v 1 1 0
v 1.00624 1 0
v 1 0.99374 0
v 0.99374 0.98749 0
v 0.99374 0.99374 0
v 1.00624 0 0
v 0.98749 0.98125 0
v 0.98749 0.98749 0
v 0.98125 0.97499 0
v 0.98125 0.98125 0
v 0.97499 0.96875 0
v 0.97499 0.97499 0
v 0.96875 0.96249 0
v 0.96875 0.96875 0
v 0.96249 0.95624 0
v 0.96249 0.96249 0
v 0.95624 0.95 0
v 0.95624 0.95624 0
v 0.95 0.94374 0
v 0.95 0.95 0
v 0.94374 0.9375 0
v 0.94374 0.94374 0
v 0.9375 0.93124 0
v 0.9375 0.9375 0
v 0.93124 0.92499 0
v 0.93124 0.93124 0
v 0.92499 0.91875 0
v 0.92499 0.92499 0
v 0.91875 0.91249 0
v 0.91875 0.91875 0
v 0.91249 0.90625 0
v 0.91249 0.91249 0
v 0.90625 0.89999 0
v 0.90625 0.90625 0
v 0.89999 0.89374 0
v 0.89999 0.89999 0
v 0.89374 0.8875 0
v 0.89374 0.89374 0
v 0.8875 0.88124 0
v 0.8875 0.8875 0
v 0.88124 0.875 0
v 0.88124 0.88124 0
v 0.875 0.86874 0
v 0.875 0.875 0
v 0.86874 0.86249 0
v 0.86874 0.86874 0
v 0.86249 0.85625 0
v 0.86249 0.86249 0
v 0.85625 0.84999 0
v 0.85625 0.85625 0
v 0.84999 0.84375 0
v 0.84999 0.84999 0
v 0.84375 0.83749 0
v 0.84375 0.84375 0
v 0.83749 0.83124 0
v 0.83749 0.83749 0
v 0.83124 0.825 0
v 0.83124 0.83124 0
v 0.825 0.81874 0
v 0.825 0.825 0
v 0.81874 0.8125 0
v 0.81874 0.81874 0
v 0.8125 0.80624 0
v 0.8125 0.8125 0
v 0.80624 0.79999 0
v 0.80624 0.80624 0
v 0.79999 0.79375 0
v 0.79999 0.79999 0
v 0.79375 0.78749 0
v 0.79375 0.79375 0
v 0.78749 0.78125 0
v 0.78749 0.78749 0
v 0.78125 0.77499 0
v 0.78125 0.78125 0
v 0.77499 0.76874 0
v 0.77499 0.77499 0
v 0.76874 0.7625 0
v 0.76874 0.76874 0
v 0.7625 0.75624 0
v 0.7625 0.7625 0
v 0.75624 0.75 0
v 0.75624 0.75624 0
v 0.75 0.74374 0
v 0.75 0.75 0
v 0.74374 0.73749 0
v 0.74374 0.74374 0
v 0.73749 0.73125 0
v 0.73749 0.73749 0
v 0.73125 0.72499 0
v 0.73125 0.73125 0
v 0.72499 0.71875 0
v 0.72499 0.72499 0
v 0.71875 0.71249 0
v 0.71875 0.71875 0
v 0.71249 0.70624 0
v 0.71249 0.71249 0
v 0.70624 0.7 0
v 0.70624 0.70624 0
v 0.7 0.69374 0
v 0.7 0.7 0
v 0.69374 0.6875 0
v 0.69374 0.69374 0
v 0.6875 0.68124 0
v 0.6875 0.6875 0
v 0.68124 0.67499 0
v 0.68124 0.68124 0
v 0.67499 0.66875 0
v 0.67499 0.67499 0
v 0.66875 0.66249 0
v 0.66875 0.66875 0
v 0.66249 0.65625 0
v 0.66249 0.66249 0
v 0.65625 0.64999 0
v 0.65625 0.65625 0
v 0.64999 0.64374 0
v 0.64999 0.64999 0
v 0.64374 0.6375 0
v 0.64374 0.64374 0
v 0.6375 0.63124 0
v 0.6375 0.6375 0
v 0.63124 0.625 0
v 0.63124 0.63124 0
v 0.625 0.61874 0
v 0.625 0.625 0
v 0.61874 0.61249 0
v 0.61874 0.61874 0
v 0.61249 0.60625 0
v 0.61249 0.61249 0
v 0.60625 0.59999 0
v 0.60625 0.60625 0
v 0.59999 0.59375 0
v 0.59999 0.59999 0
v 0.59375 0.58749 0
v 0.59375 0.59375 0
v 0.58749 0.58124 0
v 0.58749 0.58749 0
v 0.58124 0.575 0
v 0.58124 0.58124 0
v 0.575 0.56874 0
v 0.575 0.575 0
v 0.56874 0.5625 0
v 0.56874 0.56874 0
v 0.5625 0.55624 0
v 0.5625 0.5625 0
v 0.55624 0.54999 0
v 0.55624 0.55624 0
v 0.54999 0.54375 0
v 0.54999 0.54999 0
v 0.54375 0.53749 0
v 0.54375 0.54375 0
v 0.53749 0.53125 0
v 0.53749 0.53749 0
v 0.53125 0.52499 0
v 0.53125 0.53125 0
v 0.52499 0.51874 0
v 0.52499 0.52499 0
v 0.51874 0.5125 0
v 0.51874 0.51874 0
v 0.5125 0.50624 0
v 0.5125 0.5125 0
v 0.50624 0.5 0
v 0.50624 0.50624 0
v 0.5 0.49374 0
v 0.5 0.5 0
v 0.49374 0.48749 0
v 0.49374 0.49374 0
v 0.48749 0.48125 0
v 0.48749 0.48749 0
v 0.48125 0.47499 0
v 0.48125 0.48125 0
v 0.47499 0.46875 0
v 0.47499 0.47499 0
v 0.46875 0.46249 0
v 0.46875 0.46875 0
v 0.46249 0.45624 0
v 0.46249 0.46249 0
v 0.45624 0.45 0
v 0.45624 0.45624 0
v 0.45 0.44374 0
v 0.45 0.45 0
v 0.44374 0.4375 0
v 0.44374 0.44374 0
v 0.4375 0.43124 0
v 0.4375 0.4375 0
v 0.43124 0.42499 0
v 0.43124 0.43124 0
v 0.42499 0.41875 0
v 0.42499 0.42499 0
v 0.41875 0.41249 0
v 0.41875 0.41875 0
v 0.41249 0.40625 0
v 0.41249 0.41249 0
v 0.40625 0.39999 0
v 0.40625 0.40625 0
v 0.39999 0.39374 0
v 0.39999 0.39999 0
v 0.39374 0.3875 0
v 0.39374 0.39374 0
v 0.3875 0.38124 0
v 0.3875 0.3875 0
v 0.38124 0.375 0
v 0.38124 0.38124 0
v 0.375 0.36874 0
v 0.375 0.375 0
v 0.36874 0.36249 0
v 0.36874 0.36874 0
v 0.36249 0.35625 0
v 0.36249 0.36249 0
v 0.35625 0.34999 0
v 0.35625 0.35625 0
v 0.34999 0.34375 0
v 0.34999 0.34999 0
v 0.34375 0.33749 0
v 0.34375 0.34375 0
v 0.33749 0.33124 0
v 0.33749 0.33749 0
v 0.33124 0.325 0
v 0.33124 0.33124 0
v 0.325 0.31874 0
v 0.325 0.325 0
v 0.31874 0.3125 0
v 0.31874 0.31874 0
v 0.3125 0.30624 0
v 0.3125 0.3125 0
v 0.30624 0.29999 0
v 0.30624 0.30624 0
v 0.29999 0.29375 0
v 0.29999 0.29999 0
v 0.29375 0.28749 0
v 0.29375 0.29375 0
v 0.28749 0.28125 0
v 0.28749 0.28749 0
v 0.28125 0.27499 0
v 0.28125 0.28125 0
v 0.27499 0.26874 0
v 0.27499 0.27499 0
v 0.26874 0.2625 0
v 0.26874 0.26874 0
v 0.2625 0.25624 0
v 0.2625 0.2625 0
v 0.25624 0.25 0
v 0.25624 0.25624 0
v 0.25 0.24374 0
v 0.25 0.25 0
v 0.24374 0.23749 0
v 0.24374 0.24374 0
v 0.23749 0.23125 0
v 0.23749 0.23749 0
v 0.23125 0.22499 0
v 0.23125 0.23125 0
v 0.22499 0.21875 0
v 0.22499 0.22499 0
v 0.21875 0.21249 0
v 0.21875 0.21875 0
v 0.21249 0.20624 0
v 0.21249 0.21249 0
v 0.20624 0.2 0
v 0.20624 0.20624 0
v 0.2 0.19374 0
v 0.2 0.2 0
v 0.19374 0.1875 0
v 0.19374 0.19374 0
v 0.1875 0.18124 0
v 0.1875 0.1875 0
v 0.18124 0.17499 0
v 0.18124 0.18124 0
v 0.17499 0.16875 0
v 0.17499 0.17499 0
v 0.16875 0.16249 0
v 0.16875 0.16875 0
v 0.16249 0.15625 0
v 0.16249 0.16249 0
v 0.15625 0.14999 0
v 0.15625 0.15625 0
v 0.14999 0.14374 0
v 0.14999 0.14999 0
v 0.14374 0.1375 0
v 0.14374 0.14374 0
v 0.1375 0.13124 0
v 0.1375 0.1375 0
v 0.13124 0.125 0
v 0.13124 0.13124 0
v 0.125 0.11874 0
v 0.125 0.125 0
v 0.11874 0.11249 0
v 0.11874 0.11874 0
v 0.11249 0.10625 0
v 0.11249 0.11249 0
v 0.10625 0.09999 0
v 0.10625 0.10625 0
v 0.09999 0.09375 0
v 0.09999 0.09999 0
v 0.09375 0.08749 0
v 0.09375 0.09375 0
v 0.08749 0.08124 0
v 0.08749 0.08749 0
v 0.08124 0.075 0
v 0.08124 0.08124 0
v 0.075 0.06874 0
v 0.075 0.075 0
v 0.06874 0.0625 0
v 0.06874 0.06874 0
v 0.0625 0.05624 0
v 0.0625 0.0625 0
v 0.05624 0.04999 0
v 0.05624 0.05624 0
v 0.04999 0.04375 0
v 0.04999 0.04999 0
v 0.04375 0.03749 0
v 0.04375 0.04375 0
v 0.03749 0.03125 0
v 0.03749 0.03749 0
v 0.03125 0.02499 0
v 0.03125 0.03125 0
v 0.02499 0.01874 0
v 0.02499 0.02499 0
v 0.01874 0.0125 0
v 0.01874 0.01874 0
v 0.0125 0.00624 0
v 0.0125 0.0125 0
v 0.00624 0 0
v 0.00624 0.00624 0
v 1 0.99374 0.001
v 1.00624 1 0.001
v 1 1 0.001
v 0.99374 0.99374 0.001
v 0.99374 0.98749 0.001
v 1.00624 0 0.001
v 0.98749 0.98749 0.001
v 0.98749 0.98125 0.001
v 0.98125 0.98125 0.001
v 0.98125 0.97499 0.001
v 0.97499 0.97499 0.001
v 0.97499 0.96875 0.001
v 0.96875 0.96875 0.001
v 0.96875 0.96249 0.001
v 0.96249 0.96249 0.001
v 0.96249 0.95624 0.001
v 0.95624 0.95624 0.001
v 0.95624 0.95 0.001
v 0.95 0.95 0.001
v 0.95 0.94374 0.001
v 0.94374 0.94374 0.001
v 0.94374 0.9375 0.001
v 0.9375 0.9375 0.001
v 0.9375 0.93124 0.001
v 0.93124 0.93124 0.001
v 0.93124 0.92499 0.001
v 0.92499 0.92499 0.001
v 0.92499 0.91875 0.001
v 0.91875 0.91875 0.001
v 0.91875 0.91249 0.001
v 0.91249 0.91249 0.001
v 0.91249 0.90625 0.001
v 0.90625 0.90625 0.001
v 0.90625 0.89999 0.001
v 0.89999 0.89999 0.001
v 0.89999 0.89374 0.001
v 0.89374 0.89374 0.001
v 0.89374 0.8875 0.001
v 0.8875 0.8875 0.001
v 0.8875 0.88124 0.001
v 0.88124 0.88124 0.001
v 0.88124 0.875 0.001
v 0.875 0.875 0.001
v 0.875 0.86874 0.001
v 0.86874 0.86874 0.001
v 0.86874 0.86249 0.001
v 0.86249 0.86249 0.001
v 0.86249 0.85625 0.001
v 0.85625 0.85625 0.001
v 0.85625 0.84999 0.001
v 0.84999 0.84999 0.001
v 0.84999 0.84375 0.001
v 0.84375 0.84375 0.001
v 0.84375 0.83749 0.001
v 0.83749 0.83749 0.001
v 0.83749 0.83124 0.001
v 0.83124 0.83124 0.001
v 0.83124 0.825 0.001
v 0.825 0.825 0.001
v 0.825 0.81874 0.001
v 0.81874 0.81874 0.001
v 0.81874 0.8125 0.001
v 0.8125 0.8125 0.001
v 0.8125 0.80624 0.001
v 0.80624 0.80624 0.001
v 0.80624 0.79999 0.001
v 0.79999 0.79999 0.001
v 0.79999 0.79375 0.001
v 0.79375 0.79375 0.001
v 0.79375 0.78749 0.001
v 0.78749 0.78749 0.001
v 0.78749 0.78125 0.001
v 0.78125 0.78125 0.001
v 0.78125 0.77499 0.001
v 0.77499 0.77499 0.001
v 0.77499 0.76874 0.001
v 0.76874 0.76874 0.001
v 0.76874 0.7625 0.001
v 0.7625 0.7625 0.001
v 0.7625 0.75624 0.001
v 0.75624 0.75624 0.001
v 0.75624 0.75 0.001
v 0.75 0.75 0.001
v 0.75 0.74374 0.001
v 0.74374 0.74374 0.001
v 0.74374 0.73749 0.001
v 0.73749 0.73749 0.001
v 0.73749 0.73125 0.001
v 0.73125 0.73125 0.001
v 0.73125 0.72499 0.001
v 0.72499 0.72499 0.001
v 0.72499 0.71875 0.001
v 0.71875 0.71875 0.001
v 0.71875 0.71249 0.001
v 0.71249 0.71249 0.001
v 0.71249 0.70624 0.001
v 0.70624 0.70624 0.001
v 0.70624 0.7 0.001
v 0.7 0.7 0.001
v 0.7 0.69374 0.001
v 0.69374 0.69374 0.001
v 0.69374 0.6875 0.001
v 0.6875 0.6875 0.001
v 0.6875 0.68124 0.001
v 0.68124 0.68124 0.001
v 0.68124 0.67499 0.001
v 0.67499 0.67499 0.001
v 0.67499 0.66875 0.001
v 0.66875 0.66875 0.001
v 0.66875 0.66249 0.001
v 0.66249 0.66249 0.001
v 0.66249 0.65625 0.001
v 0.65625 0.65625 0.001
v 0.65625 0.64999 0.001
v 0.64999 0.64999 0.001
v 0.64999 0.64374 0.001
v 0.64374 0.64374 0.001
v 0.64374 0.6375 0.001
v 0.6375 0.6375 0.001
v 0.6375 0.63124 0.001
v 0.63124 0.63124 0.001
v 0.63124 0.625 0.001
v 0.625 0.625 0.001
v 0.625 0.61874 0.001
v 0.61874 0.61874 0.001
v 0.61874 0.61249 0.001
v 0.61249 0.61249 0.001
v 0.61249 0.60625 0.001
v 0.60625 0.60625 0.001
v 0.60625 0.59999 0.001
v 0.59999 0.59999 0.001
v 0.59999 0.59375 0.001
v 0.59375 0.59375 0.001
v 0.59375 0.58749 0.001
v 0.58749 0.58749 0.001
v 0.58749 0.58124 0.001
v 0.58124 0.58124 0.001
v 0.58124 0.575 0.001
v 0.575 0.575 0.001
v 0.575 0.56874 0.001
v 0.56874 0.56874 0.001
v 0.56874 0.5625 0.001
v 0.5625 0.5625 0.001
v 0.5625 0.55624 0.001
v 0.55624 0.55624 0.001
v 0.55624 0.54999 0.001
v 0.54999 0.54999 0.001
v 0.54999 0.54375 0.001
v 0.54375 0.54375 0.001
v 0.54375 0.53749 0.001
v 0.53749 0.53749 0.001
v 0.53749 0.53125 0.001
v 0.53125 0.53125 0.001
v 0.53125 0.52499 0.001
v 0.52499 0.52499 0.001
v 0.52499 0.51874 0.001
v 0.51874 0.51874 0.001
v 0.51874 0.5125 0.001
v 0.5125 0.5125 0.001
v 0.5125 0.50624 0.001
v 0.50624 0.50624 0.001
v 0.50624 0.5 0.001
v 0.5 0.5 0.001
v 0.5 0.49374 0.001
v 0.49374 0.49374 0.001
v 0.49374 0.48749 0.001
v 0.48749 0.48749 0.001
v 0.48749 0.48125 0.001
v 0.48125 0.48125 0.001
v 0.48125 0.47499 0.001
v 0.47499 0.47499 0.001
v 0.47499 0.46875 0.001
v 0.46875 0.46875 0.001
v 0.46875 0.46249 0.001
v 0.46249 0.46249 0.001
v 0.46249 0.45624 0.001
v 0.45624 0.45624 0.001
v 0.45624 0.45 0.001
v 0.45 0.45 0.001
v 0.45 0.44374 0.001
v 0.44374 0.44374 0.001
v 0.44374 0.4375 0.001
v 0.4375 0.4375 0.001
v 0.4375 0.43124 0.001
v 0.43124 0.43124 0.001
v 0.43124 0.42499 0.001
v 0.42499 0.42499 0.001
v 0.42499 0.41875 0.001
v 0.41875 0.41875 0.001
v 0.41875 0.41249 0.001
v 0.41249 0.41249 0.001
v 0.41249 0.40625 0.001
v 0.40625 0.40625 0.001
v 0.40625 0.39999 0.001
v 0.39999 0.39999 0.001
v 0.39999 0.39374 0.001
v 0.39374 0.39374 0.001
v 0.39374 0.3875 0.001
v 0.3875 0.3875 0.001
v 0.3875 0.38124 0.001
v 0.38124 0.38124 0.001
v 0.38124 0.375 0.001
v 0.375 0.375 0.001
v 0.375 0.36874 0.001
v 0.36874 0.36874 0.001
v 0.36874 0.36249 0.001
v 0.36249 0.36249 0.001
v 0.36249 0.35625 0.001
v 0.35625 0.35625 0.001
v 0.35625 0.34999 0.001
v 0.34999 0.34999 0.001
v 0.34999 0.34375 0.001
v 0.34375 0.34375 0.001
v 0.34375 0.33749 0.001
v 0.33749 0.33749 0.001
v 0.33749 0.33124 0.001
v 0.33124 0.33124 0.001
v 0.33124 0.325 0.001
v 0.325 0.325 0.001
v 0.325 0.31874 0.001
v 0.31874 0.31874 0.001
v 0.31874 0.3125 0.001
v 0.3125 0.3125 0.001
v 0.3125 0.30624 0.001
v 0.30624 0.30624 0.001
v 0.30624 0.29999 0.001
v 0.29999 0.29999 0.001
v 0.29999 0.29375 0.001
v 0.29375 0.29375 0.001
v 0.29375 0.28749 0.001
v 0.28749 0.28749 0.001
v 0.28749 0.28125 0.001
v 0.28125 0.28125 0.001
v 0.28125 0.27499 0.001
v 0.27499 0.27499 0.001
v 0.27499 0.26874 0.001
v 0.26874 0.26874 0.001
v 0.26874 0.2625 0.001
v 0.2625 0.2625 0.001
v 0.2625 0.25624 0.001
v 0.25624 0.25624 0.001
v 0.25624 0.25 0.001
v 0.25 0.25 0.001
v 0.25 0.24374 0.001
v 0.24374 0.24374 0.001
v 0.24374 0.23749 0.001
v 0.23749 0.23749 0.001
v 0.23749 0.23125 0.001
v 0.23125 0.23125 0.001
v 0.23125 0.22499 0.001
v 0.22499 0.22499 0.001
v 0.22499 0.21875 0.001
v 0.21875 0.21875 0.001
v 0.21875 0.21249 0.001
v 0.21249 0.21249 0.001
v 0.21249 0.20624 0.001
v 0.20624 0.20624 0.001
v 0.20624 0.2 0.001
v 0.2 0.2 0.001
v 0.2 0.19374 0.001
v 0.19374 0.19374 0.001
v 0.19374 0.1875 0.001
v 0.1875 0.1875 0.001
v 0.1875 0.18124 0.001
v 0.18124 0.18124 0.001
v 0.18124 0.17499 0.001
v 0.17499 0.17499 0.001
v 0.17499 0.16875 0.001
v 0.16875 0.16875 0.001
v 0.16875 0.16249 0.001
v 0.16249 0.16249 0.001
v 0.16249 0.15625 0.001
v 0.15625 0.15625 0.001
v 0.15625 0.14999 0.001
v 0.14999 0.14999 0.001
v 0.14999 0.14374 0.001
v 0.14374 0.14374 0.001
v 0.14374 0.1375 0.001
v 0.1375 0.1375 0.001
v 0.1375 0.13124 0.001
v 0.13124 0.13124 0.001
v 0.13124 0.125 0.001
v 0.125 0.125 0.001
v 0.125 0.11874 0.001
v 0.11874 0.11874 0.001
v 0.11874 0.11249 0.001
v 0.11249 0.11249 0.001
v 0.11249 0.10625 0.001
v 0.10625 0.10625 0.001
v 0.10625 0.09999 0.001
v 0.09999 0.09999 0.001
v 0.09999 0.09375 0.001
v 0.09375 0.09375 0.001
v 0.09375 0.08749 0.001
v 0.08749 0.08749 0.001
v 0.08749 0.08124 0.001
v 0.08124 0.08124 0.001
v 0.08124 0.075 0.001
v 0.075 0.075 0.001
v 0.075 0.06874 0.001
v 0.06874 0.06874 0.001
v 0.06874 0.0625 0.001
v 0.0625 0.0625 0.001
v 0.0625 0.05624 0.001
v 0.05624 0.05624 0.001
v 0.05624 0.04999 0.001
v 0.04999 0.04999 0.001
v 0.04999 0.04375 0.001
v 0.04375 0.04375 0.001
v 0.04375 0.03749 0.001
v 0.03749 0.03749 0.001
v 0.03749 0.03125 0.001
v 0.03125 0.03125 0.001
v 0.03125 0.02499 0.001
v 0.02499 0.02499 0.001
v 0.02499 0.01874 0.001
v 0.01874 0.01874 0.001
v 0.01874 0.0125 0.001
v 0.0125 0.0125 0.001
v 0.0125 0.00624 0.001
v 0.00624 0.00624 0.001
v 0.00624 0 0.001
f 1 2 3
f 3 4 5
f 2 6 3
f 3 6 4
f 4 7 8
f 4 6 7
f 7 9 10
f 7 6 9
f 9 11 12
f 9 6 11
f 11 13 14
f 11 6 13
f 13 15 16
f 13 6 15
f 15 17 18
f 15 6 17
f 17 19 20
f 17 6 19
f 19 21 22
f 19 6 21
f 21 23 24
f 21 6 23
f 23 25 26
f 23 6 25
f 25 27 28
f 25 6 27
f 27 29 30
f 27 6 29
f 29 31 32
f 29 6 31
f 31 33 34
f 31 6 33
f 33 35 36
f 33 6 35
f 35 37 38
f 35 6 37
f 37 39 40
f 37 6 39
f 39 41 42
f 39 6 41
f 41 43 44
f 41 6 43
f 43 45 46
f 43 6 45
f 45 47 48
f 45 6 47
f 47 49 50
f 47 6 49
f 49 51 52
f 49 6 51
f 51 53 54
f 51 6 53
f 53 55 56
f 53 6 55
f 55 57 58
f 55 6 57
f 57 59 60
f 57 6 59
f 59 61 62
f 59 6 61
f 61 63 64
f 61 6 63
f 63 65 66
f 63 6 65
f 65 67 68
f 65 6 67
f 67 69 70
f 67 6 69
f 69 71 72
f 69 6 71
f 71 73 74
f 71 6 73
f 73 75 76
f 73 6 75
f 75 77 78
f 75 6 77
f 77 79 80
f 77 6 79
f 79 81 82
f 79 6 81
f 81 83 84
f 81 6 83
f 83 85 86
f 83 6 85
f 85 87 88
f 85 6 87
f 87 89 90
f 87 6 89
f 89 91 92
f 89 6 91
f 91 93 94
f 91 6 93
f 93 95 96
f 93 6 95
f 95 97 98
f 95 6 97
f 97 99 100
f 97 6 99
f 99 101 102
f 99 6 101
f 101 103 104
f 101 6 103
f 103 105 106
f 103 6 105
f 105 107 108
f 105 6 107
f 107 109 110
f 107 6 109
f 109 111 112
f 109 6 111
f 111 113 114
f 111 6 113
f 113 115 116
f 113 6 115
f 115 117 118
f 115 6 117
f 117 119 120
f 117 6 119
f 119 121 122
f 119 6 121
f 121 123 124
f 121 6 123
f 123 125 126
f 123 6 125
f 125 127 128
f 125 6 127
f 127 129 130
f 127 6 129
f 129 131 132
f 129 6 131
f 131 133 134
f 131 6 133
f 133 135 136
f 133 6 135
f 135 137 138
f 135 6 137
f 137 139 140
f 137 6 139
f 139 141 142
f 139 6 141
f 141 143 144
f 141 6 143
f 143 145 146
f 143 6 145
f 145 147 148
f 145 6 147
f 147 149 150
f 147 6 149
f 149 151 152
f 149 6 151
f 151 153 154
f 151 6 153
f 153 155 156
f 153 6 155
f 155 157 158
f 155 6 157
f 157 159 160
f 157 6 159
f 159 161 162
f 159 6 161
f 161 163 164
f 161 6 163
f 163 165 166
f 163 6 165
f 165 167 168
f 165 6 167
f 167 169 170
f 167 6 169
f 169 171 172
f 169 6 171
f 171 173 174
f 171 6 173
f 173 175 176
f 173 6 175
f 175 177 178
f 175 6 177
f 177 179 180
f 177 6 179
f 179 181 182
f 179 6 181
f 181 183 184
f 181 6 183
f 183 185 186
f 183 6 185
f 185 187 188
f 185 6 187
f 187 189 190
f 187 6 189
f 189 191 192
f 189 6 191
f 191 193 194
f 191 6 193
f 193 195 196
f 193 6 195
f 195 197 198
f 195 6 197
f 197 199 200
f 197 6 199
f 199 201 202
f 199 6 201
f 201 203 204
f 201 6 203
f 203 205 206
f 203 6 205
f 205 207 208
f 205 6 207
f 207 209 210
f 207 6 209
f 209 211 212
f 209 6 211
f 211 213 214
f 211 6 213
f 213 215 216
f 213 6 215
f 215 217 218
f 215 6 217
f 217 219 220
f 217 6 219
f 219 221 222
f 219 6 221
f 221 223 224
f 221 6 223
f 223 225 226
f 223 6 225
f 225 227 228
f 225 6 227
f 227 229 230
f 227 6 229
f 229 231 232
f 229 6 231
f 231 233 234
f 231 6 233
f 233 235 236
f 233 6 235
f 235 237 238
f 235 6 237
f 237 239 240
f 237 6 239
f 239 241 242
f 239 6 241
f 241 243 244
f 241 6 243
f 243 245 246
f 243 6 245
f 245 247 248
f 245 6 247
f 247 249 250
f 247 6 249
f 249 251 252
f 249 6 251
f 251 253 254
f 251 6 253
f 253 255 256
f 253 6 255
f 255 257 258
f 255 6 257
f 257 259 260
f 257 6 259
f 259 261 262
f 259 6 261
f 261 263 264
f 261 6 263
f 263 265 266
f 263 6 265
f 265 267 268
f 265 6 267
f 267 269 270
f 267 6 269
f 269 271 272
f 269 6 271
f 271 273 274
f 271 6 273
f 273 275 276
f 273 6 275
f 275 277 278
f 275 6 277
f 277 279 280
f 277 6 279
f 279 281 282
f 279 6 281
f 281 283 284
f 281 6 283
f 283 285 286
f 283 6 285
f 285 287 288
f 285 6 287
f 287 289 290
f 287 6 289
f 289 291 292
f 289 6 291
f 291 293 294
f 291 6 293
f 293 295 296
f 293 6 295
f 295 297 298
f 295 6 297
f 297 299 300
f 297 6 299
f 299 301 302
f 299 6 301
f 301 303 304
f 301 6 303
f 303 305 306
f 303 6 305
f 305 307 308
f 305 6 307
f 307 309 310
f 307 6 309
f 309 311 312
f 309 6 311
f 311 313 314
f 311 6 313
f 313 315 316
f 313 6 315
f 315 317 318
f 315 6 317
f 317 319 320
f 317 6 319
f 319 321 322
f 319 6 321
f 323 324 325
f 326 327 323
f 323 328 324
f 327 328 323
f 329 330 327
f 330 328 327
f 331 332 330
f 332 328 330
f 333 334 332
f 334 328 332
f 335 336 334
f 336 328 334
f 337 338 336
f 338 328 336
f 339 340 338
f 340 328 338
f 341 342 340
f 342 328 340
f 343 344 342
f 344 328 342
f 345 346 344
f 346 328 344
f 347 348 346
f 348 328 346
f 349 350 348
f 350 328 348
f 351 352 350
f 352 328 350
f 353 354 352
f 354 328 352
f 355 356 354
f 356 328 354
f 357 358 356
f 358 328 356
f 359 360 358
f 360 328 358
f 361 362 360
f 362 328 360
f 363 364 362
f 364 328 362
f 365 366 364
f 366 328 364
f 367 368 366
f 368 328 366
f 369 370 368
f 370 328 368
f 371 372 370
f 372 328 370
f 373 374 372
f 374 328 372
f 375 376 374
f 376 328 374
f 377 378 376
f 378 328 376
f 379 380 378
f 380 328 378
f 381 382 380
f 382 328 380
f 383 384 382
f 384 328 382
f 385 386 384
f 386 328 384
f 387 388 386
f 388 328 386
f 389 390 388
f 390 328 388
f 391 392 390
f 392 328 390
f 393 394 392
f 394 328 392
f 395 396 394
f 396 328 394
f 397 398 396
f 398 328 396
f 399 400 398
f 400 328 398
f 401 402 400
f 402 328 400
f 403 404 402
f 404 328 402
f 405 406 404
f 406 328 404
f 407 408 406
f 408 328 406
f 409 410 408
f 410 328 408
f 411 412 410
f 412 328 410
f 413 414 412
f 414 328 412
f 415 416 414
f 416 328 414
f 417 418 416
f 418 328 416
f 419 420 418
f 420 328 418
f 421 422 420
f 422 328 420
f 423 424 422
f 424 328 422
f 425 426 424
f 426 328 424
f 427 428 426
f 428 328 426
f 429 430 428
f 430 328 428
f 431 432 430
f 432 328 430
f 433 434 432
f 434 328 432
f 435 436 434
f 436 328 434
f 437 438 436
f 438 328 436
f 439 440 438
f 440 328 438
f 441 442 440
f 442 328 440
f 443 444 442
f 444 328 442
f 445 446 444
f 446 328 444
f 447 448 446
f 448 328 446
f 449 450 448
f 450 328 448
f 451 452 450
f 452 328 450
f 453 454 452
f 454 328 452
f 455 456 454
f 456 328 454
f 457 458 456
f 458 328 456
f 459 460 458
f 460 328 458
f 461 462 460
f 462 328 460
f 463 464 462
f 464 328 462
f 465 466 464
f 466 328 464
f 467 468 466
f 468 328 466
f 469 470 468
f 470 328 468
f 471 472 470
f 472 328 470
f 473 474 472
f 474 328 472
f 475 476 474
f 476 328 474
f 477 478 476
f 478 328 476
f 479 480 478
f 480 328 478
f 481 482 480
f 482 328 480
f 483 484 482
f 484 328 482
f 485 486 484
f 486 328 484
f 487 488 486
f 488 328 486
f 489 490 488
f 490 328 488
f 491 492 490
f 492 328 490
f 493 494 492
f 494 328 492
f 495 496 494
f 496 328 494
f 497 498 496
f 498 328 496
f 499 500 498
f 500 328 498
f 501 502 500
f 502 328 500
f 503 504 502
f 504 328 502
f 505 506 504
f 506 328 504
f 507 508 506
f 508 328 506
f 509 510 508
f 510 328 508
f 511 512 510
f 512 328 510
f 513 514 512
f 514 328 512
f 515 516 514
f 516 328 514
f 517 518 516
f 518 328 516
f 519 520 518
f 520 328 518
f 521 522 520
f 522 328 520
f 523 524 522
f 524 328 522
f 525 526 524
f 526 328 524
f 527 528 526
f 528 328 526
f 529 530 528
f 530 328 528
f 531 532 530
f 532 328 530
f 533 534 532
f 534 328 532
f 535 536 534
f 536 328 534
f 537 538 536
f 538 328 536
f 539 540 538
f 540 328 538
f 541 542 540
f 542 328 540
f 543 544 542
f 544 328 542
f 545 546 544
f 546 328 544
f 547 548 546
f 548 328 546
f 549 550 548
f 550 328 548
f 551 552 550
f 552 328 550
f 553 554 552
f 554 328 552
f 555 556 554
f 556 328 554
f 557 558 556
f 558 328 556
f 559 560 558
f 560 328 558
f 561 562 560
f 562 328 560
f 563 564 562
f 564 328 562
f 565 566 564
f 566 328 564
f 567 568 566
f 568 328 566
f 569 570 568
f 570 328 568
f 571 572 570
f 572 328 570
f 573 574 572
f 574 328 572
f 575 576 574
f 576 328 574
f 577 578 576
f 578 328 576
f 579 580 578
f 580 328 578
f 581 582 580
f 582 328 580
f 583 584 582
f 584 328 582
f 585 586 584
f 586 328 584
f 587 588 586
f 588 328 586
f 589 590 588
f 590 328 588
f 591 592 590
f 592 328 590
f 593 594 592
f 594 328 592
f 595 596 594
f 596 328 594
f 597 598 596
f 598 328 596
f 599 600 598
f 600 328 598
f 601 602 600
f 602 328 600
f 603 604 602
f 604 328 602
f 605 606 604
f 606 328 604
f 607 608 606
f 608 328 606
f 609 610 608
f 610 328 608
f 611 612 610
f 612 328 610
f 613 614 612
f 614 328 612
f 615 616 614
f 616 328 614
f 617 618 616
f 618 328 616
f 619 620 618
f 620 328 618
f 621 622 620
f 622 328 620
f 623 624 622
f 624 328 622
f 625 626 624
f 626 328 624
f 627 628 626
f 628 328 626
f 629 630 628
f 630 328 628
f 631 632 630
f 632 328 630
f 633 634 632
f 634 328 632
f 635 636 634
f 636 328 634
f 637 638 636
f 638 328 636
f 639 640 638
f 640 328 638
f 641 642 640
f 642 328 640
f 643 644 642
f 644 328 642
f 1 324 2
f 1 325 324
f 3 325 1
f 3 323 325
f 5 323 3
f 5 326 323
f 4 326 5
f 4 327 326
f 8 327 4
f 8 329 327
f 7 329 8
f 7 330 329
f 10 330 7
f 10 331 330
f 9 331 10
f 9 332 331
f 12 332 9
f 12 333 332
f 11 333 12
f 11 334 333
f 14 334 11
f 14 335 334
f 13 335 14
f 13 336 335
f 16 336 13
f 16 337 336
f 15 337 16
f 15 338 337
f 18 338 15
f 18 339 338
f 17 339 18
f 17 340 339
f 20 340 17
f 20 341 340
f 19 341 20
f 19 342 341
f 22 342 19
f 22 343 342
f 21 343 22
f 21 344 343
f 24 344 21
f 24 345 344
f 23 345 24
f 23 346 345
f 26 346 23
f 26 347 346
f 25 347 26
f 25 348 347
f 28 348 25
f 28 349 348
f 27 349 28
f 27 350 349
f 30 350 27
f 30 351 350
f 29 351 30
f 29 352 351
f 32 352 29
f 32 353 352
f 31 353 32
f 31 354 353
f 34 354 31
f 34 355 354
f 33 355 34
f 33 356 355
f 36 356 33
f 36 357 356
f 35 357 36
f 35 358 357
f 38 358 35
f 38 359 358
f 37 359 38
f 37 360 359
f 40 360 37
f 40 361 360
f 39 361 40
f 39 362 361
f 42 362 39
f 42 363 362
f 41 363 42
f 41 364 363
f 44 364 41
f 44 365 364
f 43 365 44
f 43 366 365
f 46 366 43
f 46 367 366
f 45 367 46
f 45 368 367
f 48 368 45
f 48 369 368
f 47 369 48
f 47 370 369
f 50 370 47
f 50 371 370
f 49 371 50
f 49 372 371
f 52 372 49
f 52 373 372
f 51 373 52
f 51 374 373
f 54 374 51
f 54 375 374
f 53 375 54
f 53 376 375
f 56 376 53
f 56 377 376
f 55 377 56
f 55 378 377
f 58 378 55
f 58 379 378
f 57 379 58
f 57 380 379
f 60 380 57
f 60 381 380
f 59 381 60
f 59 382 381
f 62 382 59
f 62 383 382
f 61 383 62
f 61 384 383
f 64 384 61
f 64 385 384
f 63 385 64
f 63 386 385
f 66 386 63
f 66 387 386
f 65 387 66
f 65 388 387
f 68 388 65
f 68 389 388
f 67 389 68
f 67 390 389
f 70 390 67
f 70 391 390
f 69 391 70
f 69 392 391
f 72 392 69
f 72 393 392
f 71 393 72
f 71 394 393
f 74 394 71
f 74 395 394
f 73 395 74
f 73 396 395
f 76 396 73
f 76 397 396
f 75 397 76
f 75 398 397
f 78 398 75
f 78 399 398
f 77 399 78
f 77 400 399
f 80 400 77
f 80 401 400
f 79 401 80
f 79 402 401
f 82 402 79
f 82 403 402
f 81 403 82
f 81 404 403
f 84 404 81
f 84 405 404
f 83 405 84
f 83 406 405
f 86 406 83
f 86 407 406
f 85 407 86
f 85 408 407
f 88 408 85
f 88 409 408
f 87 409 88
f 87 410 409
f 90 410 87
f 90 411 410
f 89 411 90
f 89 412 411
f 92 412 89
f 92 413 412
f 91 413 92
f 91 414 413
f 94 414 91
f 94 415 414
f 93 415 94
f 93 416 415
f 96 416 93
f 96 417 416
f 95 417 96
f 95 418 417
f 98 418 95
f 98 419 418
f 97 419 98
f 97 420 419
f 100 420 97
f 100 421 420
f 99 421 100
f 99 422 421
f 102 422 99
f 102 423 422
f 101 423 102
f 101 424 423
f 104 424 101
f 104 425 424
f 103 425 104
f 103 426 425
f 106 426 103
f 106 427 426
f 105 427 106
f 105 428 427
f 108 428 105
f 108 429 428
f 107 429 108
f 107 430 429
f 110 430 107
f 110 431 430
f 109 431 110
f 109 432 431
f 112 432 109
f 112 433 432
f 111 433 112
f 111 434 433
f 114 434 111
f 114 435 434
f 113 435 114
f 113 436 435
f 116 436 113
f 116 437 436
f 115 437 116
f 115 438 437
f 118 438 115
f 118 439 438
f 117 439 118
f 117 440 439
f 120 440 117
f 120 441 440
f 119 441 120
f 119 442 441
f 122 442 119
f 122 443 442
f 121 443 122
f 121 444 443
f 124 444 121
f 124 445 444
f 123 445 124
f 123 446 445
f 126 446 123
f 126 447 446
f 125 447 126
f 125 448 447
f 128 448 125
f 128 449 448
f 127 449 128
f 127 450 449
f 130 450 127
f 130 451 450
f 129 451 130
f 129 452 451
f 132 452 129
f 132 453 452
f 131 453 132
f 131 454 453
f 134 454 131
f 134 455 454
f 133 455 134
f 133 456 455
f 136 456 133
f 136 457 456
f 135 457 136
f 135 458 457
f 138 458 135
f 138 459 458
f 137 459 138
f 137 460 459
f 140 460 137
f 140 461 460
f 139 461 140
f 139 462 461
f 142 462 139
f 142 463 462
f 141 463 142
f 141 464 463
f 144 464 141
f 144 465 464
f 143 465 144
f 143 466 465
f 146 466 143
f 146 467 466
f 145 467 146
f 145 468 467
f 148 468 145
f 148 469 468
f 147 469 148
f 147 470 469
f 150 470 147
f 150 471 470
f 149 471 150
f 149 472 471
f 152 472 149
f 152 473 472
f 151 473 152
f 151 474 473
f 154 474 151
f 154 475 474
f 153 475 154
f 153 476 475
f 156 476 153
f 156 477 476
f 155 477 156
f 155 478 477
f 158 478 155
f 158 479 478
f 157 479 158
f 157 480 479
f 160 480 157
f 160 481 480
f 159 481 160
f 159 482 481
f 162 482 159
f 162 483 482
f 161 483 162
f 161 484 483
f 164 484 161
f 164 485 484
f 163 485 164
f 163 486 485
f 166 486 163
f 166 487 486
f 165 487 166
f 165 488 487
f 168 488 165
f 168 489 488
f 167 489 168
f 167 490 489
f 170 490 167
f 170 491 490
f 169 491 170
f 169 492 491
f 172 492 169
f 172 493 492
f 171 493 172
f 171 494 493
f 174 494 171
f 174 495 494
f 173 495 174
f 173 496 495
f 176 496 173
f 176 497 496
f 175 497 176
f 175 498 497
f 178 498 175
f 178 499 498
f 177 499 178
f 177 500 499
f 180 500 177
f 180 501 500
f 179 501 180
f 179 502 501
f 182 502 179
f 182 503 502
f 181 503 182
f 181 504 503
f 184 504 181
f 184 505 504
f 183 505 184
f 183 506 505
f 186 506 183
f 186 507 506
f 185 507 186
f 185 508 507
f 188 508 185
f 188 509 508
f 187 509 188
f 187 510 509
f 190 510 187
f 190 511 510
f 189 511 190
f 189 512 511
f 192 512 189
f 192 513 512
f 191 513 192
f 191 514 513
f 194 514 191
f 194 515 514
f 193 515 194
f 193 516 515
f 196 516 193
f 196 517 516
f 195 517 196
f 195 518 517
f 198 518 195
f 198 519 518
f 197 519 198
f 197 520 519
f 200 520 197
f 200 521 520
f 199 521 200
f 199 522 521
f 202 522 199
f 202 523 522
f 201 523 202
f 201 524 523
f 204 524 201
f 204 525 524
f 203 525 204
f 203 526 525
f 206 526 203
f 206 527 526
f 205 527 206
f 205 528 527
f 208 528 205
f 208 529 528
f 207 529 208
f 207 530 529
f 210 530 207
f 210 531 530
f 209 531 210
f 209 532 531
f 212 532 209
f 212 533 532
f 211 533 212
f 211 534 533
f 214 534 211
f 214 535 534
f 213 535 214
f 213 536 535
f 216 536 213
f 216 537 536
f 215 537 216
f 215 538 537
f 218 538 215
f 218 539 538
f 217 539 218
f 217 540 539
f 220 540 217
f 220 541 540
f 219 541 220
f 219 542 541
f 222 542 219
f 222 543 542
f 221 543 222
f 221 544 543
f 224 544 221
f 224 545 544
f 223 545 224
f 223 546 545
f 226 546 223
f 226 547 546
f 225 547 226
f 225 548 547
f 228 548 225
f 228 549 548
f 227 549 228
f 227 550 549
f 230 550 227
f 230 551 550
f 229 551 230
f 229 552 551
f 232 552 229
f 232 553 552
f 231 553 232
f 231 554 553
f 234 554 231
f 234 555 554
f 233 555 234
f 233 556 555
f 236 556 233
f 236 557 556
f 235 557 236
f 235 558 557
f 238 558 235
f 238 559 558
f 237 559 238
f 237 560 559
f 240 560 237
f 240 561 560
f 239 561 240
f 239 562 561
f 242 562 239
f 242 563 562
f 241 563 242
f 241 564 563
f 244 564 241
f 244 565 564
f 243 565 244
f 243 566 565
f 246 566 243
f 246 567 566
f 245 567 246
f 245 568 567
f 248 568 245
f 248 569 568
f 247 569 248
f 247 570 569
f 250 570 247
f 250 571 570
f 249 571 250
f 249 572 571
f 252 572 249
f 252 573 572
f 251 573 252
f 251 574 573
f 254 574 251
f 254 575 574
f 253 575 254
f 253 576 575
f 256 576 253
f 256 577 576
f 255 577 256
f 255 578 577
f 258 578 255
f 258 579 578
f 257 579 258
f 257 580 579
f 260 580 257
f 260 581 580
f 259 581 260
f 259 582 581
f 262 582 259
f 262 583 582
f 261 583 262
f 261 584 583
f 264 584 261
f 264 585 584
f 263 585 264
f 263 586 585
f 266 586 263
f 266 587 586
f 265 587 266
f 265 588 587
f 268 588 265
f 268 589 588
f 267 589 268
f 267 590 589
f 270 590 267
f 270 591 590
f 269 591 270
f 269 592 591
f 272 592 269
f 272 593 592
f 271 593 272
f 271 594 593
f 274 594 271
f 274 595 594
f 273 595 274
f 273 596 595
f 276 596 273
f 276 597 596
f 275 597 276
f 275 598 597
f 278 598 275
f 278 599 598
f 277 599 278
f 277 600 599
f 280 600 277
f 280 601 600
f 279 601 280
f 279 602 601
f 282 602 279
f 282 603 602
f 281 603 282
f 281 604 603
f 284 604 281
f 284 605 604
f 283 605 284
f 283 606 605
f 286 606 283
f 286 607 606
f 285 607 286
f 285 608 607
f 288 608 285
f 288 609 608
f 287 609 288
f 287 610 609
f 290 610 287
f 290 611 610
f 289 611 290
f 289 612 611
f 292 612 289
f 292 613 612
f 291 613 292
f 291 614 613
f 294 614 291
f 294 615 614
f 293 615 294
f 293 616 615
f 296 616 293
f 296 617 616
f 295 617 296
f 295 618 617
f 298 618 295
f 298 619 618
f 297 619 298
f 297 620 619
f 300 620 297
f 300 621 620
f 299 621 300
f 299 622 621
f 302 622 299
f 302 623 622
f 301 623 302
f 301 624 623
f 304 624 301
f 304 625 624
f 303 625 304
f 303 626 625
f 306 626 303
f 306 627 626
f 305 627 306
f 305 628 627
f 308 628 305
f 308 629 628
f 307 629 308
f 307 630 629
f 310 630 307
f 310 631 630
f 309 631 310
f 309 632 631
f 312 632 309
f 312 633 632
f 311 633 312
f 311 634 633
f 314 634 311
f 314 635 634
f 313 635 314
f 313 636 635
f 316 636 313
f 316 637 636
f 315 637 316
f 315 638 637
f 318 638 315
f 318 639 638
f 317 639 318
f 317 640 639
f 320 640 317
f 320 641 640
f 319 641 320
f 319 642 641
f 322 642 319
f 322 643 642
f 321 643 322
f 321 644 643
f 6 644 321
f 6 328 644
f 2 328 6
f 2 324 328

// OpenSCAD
*linear_extrude(0.001)
for(i=[-0:1/160:1])translate([i,0])square([1/160,(lerp(0,1, (i)))]);
    function lerp(start, end, bias) = (end * bias + start * (1 - bias));
linear_extrude(0.001)
for(i=[-0:1/160:1])translate([i,0])square([1/160,(lerp(0,1, (i)))]);
    function lerp(start, end, bias) = (end * bias + start * (1 - bias));

for(i=[-0:1/160:1])translate([i,0])square([1/160, (step( (i),2/3,0.1))]);
    function step(v,bias,start=0, end=1) = v>=bias?end:start;

for(i=[-0:1/160:1])translate([i,0])square([1/160, (mstep( i,5))]);
    function mstep(v,steps=3) = (floor(v*steps)/steps );

for(i=[-0:1/160:1])translate([i,0])square([1/160, (mods(  (i),5))]);
    function mods(v,steps=3) = ( (v*steps)%1);

for(i=[-0:1/160:1])translate([i,0])square([1/160, (smooth( (i),2/3,0.1))]);
    function smooth (a) =let (b = clamp(a))(b * b * (3 - 2 * b));
    function clamp(a, b = 0, c = 1) = min(max(a, b), c);

for(i=[-0:1/160:1])translate([i,0])square([1/160, (step( (i),2/3,0.3,0.7))]);
    function step(v,bias,start=0, end=1) = v>=bias?end:start;


for(i=[-0:1/160:1])translate([i,0])square([1/160,  (arc1(  (i)))]);
    function arc1 (x,n=0) = let(a= n>0? arc1(x,(n-1)):x) clamp(sqrt(1-(1-a)*(1-a)));
    function arc2 (x,n=0) =let(a= n>0? arc2(x,(n-1)):x) clamp( 1-sqrt(1-(a)*(a)));
    function arcs1(v,steps=3) = arc1(mods(v,steps),1)/steps+mstep(v,steps);
    function arcs2(v,steps=3) = arc2(mods(v,steps),1)/steps+mstep(v,steps);
    function clamp(a, b = 0, c = 1) = min(max(a, b), c);

for(i=[-0:1/160:1])translate([i,0])square([1/160, (arc2(  (i)))]);
    function arc1 (x,n=0) = let(a= n>0? arc1(x,(n-1)):x) clamp(sqrt(1-(1-a)*(1-a)));
    function arc2 (x,n=0) =let(a= n>0? arc2(x,(n-1)):x) clamp( 1-sqrt(1-(a)*(a)));
    function arcs1(v,steps=3) = arc1(mods(v,steps),1)/steps+mstep(v,steps);
    function arcs2(v,steps=3) = arc2(mods(v,steps),1)/steps+mstep(v,steps);
    function clamp(a, b = 0, c = 1) = min(max(a, b), c);


for(i=[-0:1/160:1])translate([i,0])square([1/160, (ramp( (i),1/3,2/3,0.1)) ]);
    function ramp(v,bi1=1/3,bi2=2/3,start=1/3, end=2/3) = 
        let(b1=min(bi1,bi2),b2=max(bi1,bi2))
        v<=b1?start:v<=b2?lerp(start,end,(v-b1)/(b2-b1))    :end;
    
for(i=[-0:1/160:1])translate([i,0])square([1/160,   ( (  stepramp(i) )) ]);
    function stepramp(v,bi1=1/5,bi2=4/5,start=1/4, end=3/4) = 
        let(b1=min(bi1,bi2),b2=max(bi1,bi2))
        v<=b1?ramp(v,0,b1,0,start):v<=b2?lerp(start,end,(v-b1)/(b2-b1))    :ramp(v,b2,1,end,1);

 //for(i=[-0:1/160:1])translate([i,0])square([1/160,   (gauss(  (i))) ]);
    function gauss(x) =       x + (x - smooth(x));
    function smooth (a) =let (b = clamp(a))(b * b * (3 - 2 * b));
    function clamp(a, b = 0, c = 1) = min(max(a, b), c);

for(i=[-0:1/160:1])translate([i,0])square([1/160, (mods(  (i),5))]);
    function mods(v,steps=3) = ( (v*steps)%1);

for(i=[-0:1/160:1])translate([i,0])square([1/160, (arcs1(  (i),3))]);
    function arc1 (x,n=0) = let(a= n>0? arc1(x,(n-1)):x) clamp(sqrt(1-(1-a)*(1-a)));
    function arc2 (x,n=0) =let(a= n>0? arc2(x,(n-1)):x) clamp( 1-sqrt(1-(a)*(a)));
    function arcs1(v,steps=3) = arc1(mods(v,steps),1)/steps+mstep(v,steps);
    function arcs2(v,steps=3) = arc2(mods(v,steps),1)/steps+mstep(v,steps);
    function clamp(a, b = 0, c = 1) = min(max(a, b), c);
    function mstep(v,steps=3) = (floor(v*steps)/steps );
    function mods(v,steps=3) = ( (v*steps)%1);


for(i=[-0:1/160:1])translate([i,0])square([1/160,   (arcs2(  (i),3)) ]);
    function arc1 (x,n=0) = let(a= n>0? arc1(x,(n-1)):x) clamp(sqrt(1-(1-a)*(1-a)));
    function arc2 (x,n=0) =let(a= n>0? arc2(x,(n-1)):x) clamp( 1-sqrt(1-(a)*(a)));
    function arcs1(v,steps=3) = arc1(mods(v,steps),1)/steps+mstep(v,steps);
    function arcs2(v,steps=3) = arc2(mods(v,steps),1)/steps+mstep(v,steps);
    function clamp(a, b = 0, c = 1) = min(max(a, b), c);
    function mstep(v,steps=3) = (floor(v*steps)/steps );
    function mods(v,steps=3) = ( (v*steps)%1);




 


for(i=[-0:1/160:1])translate([i,  min(0,isinw(i))])square([1/160,   abs(isinw(  (i))) ]);
    function cosw(i)=cos(i*360)/2 -0.5+i;
    function icosw(i)=-cos(i*360)/2+0.5+i;
    function isinw(i)=gauss(i)-sin(i*360)/2;
    function sinw(i)=sin(i*360)/2+smooth(i);
    function gauss(x) =       x + (x - smooth(x));
    function smooth (a) =let (b = clamp(a))(b * b * (3 - 2 * b));
    function clamp(a, b = 0, c = 1) = min(max(a, b), c);

for(i=[-0:1/160:1])translate([i,0])square([1/160,    (sinw(  (i))) ]);
    function cosw(i)=cos(i*360)/2 -0.5+i;
    function icosw(i)=-cos(i*360)/2+0.5+i;
    function isinw(i)=gauss(i)-sin(i*360)/2;
    function sinw(i)=sin(i*360)/2+smooth(i);
    function gauss(x) =       x + (x - smooth(x));
    function smooth (a) =let (b = clamp(a))(b * b * (3 - 2 * b));
    function clamp(a, b = 0, c = 1) = min(max(a, b), c);

for(i=[-0:1/160:1])translate([i ,  min(0,cosw(i))])square([1/160,   abs(cosw(  (i))) ]);
    function cosw(i)=cos(i*360)/2 -0.5+i;
    function icosw(i)=-cos(i*360)/2+0.5+i;
    function sinw(i)=gauss(i)-sin(i*360)/2;
    function isinw(i)=sin(i*360)/2+smooth(i);
    function gauss(x) =       x + (x - smooth(x));
    function smooth (a) =let (b = clamp(a))(b * b * (3 - 2 * b));
    function clamp(a, b = 0, c = 1) = min(max(a, b), c);

for(i=[-0:1/160:1])translate([i,0])square([1/160,    (icosw(  (i))) ]);
    function cosw(i)=cos(i*360)/2 -0.5+i;
    function icosw(i)=-cos(i*360)/2+0.5+i;
    function sinw(i)=gauss(i)-sin(i*360)/2;
    function isinw(i)=sin(i*360)/2+smooth(i);
    function gauss(x) =       x + (x - smooth(x));
    function smooth (a) =let (b = clamp(a))(b * b * (3 - 2 * b));
    function clamp(a, b = 0, c = 1) = min(max(a, b), c);


for(i=[-0:1/160:1])translate([i,0])square([1/160,   (smooths(  smooth(i),3 )) ]);
    function smooths(v,steps) =smooth( smooth(mods(v,steps) ))/steps+mstep(v,steps);
    function smooth (a) =let (b = clamp(a))(b * b * (3 - 2 * b));
    function clamp(a, b = 0, c = 1) = min(max(a, b), c);



v3=rnd(-10,10);
for(i=[-0:1/160:1])translate([i,0])square([1/160,   ( (   power(i,v3) )) ]);
     function power(x,n) = n<0?pow(x,1/abs(min(-1,n-1) )):pow(x,max(1,n+1))   ;



for(i=[-0:1/160:1])translate([i,0])square([1/160,   ( (   fx4(i) )) ]);
    function fx4(x) =  clamp(pow(x-0.5,3)*4+0.5);
    function clamp(a, b = 0, c = 1) = min(max(a, b), c);

for(i=[-0:1/160:1])translate([i,0])square([1/160,   ( (   ifx4(i) )) ]);
     function ifx4(x) =       ((x+ x-fx4(x))-0.5)*0.9+0.5 ;


for(i=[-0:1/160:1])translate([i,0])square([1/160,   ( (   fx6(i) )) ]);
     function fx6(x,k=5,n=4) =1- (exp( -k*pow(x,n) ));




for(i=[-0:1/160:1])translate([i,0])square([1/160,   ( (   bez2(gauss(i),[0,2,0.5,0,1,1]) )) ]);
    function bez2(t, v) = (len(v) > 2) ? bez2(t, [
          for (i = [0: len(v) - 2]) lerp(v[i] , v[i + 1] , t)
        ]): lerp(v[0] , v[1] ,t);

    function lerp(start, end, bias) = (end * bias + start * (1 - bias));

for(i=[-1:1/160:1])translate([bisignmap(i),0])square([1/160,  map(infmap(i*12) )   ]);
    function bisignmap(i)=(i+1)/2;
    function infmap(i)=max(0,1-(1/(abs(i)+1)))*sign(i);
    function  map(  value,istart=-1, istop=1, ostart=0, ostop=1) =
    ostart + (ostop - ostart) * ((value - istart) / (istop - istart));

v1=rnd();v2=rnd();
for(i=[-0:1/160:1])translate([i,0])square([1/160,  ((  comp(i,v1,v2)))]);
    function comp(i,c=0.5,s=0.75)=i<c? ramp(i,0,c,0,s) :ramp(i,c,1,s,1) ;
    function ramp(v,bi1=1/3,bi2=2/3,start=1/3, end=2/3) = 
        let(b1=min(bi1,bi2),b2=max(bi1,bi2))
        v<=b1?start:v<=b2?lerp(start,end,(v-b1)/(b2-b1))    :end;
      




for(i=[-0:1/160:1])translate([i,0])square([1/160,     clamp(fx4(i),0.2,0.8)]);
    function fx4(x) =  clamp(pow(x-0.5,3)*4+0.5);
    function ifx4(x) =       ((x+ x-fx4(x))-0.5)*0.9+0.5 ;
    function clamp(a, b = 0, c = 1) = min(max(a, b), c);

for(i=[-0:1/160:1])translate([i,0])square([1/160,   ( (  max(smooth(i),gauss(i))))]);
    function smooth (a) =let (b = clamp(a))(b * b * (3 - 2 * b));
    function clamp(a, b = 0, c = 1) = min(max(a, b), c);




//function multimix (v,m)=v*un(m);
function multimix (v,m)=let(um=pun(m)) ([for(i=[0:len(v)-1])v[i]*um[i]]);
function amp(fx,f0,f1)=(fx-f0)/(f1-f0);
function bounce(v)=0.5-abs( -v+0.5) ;
function reflectf(v)=0.5-abs( v-0.5) ;
function reflectl(v)=0.5+abs( v-0.5) ;




function expand(i,c1,c2,s)=i<c? ramp(i,0,c,0,s) :ramp(i,c,1,s,1) ;
 



function minmax(i,v1,v2,bias=0.5) =  i>=bias?max(v1,v2):min(v1,v2);
 


function maskmix(v1,v2,c ) =  lerp(v1,v2,c);


function mix(start, end, bias) = (end * bias + start * (1 - bias));
 






function clamp(a, b = 0, c = 1) = min(max(a, b), c);




;


function un(v)=v/max(norm(v),1e-16);
function pun(v)=v/max(sumv(v),1e-16);
function sumv(l)=  len(l) > 0 ? [ for(li=l) 1 ] * l : undef;

 function f(x) = 1-abs(1/(1+x));
 function fx(x) =( fx10(  (x)));
 function fx1(x) = 1-((1-x)*(1-x));
 function fx3(x) = 1-((x)*(x));


 function fx5(x,k=8) =k*x*x*exp(1-k*x*x);
 function fx7(x,k=0.3 ) = pow( 4.0*x*(1.0-x), k );
 function fx8(x,k=0.3 ) = 1+(sqrt(log (x))/2);
 function fx9(x,k=0.3 ) = lerp(lerp(0,1,1-x- ((7/x  )%(x/7)) ),lerp(0,1, x- ((4/x  )%(x/7)) ),x) ;
 function fx10(x,k=4 ) = lerp(clamp( (x-0.5)*k ),clamp( (x-0.5)*k+1 ), x);
function rnd(a = 1, b = 0, s = []) = 
  s == [] ? 
   (rands(min(a, b), max(   a, b), 1)[0]) 
  : 
   (rands(min(a, b), max(a, b), 1, s)[0])
  ; 




module polyline(p) {for(i=[0:max(0,len(p)-2)])line(p[i],p[i+1]);
}

module line(p1, p2 ,width=0.5) 
{
    hull() {
        translate(p1) sphere(width);
        translate(p2) sphere(width);
    }
}
